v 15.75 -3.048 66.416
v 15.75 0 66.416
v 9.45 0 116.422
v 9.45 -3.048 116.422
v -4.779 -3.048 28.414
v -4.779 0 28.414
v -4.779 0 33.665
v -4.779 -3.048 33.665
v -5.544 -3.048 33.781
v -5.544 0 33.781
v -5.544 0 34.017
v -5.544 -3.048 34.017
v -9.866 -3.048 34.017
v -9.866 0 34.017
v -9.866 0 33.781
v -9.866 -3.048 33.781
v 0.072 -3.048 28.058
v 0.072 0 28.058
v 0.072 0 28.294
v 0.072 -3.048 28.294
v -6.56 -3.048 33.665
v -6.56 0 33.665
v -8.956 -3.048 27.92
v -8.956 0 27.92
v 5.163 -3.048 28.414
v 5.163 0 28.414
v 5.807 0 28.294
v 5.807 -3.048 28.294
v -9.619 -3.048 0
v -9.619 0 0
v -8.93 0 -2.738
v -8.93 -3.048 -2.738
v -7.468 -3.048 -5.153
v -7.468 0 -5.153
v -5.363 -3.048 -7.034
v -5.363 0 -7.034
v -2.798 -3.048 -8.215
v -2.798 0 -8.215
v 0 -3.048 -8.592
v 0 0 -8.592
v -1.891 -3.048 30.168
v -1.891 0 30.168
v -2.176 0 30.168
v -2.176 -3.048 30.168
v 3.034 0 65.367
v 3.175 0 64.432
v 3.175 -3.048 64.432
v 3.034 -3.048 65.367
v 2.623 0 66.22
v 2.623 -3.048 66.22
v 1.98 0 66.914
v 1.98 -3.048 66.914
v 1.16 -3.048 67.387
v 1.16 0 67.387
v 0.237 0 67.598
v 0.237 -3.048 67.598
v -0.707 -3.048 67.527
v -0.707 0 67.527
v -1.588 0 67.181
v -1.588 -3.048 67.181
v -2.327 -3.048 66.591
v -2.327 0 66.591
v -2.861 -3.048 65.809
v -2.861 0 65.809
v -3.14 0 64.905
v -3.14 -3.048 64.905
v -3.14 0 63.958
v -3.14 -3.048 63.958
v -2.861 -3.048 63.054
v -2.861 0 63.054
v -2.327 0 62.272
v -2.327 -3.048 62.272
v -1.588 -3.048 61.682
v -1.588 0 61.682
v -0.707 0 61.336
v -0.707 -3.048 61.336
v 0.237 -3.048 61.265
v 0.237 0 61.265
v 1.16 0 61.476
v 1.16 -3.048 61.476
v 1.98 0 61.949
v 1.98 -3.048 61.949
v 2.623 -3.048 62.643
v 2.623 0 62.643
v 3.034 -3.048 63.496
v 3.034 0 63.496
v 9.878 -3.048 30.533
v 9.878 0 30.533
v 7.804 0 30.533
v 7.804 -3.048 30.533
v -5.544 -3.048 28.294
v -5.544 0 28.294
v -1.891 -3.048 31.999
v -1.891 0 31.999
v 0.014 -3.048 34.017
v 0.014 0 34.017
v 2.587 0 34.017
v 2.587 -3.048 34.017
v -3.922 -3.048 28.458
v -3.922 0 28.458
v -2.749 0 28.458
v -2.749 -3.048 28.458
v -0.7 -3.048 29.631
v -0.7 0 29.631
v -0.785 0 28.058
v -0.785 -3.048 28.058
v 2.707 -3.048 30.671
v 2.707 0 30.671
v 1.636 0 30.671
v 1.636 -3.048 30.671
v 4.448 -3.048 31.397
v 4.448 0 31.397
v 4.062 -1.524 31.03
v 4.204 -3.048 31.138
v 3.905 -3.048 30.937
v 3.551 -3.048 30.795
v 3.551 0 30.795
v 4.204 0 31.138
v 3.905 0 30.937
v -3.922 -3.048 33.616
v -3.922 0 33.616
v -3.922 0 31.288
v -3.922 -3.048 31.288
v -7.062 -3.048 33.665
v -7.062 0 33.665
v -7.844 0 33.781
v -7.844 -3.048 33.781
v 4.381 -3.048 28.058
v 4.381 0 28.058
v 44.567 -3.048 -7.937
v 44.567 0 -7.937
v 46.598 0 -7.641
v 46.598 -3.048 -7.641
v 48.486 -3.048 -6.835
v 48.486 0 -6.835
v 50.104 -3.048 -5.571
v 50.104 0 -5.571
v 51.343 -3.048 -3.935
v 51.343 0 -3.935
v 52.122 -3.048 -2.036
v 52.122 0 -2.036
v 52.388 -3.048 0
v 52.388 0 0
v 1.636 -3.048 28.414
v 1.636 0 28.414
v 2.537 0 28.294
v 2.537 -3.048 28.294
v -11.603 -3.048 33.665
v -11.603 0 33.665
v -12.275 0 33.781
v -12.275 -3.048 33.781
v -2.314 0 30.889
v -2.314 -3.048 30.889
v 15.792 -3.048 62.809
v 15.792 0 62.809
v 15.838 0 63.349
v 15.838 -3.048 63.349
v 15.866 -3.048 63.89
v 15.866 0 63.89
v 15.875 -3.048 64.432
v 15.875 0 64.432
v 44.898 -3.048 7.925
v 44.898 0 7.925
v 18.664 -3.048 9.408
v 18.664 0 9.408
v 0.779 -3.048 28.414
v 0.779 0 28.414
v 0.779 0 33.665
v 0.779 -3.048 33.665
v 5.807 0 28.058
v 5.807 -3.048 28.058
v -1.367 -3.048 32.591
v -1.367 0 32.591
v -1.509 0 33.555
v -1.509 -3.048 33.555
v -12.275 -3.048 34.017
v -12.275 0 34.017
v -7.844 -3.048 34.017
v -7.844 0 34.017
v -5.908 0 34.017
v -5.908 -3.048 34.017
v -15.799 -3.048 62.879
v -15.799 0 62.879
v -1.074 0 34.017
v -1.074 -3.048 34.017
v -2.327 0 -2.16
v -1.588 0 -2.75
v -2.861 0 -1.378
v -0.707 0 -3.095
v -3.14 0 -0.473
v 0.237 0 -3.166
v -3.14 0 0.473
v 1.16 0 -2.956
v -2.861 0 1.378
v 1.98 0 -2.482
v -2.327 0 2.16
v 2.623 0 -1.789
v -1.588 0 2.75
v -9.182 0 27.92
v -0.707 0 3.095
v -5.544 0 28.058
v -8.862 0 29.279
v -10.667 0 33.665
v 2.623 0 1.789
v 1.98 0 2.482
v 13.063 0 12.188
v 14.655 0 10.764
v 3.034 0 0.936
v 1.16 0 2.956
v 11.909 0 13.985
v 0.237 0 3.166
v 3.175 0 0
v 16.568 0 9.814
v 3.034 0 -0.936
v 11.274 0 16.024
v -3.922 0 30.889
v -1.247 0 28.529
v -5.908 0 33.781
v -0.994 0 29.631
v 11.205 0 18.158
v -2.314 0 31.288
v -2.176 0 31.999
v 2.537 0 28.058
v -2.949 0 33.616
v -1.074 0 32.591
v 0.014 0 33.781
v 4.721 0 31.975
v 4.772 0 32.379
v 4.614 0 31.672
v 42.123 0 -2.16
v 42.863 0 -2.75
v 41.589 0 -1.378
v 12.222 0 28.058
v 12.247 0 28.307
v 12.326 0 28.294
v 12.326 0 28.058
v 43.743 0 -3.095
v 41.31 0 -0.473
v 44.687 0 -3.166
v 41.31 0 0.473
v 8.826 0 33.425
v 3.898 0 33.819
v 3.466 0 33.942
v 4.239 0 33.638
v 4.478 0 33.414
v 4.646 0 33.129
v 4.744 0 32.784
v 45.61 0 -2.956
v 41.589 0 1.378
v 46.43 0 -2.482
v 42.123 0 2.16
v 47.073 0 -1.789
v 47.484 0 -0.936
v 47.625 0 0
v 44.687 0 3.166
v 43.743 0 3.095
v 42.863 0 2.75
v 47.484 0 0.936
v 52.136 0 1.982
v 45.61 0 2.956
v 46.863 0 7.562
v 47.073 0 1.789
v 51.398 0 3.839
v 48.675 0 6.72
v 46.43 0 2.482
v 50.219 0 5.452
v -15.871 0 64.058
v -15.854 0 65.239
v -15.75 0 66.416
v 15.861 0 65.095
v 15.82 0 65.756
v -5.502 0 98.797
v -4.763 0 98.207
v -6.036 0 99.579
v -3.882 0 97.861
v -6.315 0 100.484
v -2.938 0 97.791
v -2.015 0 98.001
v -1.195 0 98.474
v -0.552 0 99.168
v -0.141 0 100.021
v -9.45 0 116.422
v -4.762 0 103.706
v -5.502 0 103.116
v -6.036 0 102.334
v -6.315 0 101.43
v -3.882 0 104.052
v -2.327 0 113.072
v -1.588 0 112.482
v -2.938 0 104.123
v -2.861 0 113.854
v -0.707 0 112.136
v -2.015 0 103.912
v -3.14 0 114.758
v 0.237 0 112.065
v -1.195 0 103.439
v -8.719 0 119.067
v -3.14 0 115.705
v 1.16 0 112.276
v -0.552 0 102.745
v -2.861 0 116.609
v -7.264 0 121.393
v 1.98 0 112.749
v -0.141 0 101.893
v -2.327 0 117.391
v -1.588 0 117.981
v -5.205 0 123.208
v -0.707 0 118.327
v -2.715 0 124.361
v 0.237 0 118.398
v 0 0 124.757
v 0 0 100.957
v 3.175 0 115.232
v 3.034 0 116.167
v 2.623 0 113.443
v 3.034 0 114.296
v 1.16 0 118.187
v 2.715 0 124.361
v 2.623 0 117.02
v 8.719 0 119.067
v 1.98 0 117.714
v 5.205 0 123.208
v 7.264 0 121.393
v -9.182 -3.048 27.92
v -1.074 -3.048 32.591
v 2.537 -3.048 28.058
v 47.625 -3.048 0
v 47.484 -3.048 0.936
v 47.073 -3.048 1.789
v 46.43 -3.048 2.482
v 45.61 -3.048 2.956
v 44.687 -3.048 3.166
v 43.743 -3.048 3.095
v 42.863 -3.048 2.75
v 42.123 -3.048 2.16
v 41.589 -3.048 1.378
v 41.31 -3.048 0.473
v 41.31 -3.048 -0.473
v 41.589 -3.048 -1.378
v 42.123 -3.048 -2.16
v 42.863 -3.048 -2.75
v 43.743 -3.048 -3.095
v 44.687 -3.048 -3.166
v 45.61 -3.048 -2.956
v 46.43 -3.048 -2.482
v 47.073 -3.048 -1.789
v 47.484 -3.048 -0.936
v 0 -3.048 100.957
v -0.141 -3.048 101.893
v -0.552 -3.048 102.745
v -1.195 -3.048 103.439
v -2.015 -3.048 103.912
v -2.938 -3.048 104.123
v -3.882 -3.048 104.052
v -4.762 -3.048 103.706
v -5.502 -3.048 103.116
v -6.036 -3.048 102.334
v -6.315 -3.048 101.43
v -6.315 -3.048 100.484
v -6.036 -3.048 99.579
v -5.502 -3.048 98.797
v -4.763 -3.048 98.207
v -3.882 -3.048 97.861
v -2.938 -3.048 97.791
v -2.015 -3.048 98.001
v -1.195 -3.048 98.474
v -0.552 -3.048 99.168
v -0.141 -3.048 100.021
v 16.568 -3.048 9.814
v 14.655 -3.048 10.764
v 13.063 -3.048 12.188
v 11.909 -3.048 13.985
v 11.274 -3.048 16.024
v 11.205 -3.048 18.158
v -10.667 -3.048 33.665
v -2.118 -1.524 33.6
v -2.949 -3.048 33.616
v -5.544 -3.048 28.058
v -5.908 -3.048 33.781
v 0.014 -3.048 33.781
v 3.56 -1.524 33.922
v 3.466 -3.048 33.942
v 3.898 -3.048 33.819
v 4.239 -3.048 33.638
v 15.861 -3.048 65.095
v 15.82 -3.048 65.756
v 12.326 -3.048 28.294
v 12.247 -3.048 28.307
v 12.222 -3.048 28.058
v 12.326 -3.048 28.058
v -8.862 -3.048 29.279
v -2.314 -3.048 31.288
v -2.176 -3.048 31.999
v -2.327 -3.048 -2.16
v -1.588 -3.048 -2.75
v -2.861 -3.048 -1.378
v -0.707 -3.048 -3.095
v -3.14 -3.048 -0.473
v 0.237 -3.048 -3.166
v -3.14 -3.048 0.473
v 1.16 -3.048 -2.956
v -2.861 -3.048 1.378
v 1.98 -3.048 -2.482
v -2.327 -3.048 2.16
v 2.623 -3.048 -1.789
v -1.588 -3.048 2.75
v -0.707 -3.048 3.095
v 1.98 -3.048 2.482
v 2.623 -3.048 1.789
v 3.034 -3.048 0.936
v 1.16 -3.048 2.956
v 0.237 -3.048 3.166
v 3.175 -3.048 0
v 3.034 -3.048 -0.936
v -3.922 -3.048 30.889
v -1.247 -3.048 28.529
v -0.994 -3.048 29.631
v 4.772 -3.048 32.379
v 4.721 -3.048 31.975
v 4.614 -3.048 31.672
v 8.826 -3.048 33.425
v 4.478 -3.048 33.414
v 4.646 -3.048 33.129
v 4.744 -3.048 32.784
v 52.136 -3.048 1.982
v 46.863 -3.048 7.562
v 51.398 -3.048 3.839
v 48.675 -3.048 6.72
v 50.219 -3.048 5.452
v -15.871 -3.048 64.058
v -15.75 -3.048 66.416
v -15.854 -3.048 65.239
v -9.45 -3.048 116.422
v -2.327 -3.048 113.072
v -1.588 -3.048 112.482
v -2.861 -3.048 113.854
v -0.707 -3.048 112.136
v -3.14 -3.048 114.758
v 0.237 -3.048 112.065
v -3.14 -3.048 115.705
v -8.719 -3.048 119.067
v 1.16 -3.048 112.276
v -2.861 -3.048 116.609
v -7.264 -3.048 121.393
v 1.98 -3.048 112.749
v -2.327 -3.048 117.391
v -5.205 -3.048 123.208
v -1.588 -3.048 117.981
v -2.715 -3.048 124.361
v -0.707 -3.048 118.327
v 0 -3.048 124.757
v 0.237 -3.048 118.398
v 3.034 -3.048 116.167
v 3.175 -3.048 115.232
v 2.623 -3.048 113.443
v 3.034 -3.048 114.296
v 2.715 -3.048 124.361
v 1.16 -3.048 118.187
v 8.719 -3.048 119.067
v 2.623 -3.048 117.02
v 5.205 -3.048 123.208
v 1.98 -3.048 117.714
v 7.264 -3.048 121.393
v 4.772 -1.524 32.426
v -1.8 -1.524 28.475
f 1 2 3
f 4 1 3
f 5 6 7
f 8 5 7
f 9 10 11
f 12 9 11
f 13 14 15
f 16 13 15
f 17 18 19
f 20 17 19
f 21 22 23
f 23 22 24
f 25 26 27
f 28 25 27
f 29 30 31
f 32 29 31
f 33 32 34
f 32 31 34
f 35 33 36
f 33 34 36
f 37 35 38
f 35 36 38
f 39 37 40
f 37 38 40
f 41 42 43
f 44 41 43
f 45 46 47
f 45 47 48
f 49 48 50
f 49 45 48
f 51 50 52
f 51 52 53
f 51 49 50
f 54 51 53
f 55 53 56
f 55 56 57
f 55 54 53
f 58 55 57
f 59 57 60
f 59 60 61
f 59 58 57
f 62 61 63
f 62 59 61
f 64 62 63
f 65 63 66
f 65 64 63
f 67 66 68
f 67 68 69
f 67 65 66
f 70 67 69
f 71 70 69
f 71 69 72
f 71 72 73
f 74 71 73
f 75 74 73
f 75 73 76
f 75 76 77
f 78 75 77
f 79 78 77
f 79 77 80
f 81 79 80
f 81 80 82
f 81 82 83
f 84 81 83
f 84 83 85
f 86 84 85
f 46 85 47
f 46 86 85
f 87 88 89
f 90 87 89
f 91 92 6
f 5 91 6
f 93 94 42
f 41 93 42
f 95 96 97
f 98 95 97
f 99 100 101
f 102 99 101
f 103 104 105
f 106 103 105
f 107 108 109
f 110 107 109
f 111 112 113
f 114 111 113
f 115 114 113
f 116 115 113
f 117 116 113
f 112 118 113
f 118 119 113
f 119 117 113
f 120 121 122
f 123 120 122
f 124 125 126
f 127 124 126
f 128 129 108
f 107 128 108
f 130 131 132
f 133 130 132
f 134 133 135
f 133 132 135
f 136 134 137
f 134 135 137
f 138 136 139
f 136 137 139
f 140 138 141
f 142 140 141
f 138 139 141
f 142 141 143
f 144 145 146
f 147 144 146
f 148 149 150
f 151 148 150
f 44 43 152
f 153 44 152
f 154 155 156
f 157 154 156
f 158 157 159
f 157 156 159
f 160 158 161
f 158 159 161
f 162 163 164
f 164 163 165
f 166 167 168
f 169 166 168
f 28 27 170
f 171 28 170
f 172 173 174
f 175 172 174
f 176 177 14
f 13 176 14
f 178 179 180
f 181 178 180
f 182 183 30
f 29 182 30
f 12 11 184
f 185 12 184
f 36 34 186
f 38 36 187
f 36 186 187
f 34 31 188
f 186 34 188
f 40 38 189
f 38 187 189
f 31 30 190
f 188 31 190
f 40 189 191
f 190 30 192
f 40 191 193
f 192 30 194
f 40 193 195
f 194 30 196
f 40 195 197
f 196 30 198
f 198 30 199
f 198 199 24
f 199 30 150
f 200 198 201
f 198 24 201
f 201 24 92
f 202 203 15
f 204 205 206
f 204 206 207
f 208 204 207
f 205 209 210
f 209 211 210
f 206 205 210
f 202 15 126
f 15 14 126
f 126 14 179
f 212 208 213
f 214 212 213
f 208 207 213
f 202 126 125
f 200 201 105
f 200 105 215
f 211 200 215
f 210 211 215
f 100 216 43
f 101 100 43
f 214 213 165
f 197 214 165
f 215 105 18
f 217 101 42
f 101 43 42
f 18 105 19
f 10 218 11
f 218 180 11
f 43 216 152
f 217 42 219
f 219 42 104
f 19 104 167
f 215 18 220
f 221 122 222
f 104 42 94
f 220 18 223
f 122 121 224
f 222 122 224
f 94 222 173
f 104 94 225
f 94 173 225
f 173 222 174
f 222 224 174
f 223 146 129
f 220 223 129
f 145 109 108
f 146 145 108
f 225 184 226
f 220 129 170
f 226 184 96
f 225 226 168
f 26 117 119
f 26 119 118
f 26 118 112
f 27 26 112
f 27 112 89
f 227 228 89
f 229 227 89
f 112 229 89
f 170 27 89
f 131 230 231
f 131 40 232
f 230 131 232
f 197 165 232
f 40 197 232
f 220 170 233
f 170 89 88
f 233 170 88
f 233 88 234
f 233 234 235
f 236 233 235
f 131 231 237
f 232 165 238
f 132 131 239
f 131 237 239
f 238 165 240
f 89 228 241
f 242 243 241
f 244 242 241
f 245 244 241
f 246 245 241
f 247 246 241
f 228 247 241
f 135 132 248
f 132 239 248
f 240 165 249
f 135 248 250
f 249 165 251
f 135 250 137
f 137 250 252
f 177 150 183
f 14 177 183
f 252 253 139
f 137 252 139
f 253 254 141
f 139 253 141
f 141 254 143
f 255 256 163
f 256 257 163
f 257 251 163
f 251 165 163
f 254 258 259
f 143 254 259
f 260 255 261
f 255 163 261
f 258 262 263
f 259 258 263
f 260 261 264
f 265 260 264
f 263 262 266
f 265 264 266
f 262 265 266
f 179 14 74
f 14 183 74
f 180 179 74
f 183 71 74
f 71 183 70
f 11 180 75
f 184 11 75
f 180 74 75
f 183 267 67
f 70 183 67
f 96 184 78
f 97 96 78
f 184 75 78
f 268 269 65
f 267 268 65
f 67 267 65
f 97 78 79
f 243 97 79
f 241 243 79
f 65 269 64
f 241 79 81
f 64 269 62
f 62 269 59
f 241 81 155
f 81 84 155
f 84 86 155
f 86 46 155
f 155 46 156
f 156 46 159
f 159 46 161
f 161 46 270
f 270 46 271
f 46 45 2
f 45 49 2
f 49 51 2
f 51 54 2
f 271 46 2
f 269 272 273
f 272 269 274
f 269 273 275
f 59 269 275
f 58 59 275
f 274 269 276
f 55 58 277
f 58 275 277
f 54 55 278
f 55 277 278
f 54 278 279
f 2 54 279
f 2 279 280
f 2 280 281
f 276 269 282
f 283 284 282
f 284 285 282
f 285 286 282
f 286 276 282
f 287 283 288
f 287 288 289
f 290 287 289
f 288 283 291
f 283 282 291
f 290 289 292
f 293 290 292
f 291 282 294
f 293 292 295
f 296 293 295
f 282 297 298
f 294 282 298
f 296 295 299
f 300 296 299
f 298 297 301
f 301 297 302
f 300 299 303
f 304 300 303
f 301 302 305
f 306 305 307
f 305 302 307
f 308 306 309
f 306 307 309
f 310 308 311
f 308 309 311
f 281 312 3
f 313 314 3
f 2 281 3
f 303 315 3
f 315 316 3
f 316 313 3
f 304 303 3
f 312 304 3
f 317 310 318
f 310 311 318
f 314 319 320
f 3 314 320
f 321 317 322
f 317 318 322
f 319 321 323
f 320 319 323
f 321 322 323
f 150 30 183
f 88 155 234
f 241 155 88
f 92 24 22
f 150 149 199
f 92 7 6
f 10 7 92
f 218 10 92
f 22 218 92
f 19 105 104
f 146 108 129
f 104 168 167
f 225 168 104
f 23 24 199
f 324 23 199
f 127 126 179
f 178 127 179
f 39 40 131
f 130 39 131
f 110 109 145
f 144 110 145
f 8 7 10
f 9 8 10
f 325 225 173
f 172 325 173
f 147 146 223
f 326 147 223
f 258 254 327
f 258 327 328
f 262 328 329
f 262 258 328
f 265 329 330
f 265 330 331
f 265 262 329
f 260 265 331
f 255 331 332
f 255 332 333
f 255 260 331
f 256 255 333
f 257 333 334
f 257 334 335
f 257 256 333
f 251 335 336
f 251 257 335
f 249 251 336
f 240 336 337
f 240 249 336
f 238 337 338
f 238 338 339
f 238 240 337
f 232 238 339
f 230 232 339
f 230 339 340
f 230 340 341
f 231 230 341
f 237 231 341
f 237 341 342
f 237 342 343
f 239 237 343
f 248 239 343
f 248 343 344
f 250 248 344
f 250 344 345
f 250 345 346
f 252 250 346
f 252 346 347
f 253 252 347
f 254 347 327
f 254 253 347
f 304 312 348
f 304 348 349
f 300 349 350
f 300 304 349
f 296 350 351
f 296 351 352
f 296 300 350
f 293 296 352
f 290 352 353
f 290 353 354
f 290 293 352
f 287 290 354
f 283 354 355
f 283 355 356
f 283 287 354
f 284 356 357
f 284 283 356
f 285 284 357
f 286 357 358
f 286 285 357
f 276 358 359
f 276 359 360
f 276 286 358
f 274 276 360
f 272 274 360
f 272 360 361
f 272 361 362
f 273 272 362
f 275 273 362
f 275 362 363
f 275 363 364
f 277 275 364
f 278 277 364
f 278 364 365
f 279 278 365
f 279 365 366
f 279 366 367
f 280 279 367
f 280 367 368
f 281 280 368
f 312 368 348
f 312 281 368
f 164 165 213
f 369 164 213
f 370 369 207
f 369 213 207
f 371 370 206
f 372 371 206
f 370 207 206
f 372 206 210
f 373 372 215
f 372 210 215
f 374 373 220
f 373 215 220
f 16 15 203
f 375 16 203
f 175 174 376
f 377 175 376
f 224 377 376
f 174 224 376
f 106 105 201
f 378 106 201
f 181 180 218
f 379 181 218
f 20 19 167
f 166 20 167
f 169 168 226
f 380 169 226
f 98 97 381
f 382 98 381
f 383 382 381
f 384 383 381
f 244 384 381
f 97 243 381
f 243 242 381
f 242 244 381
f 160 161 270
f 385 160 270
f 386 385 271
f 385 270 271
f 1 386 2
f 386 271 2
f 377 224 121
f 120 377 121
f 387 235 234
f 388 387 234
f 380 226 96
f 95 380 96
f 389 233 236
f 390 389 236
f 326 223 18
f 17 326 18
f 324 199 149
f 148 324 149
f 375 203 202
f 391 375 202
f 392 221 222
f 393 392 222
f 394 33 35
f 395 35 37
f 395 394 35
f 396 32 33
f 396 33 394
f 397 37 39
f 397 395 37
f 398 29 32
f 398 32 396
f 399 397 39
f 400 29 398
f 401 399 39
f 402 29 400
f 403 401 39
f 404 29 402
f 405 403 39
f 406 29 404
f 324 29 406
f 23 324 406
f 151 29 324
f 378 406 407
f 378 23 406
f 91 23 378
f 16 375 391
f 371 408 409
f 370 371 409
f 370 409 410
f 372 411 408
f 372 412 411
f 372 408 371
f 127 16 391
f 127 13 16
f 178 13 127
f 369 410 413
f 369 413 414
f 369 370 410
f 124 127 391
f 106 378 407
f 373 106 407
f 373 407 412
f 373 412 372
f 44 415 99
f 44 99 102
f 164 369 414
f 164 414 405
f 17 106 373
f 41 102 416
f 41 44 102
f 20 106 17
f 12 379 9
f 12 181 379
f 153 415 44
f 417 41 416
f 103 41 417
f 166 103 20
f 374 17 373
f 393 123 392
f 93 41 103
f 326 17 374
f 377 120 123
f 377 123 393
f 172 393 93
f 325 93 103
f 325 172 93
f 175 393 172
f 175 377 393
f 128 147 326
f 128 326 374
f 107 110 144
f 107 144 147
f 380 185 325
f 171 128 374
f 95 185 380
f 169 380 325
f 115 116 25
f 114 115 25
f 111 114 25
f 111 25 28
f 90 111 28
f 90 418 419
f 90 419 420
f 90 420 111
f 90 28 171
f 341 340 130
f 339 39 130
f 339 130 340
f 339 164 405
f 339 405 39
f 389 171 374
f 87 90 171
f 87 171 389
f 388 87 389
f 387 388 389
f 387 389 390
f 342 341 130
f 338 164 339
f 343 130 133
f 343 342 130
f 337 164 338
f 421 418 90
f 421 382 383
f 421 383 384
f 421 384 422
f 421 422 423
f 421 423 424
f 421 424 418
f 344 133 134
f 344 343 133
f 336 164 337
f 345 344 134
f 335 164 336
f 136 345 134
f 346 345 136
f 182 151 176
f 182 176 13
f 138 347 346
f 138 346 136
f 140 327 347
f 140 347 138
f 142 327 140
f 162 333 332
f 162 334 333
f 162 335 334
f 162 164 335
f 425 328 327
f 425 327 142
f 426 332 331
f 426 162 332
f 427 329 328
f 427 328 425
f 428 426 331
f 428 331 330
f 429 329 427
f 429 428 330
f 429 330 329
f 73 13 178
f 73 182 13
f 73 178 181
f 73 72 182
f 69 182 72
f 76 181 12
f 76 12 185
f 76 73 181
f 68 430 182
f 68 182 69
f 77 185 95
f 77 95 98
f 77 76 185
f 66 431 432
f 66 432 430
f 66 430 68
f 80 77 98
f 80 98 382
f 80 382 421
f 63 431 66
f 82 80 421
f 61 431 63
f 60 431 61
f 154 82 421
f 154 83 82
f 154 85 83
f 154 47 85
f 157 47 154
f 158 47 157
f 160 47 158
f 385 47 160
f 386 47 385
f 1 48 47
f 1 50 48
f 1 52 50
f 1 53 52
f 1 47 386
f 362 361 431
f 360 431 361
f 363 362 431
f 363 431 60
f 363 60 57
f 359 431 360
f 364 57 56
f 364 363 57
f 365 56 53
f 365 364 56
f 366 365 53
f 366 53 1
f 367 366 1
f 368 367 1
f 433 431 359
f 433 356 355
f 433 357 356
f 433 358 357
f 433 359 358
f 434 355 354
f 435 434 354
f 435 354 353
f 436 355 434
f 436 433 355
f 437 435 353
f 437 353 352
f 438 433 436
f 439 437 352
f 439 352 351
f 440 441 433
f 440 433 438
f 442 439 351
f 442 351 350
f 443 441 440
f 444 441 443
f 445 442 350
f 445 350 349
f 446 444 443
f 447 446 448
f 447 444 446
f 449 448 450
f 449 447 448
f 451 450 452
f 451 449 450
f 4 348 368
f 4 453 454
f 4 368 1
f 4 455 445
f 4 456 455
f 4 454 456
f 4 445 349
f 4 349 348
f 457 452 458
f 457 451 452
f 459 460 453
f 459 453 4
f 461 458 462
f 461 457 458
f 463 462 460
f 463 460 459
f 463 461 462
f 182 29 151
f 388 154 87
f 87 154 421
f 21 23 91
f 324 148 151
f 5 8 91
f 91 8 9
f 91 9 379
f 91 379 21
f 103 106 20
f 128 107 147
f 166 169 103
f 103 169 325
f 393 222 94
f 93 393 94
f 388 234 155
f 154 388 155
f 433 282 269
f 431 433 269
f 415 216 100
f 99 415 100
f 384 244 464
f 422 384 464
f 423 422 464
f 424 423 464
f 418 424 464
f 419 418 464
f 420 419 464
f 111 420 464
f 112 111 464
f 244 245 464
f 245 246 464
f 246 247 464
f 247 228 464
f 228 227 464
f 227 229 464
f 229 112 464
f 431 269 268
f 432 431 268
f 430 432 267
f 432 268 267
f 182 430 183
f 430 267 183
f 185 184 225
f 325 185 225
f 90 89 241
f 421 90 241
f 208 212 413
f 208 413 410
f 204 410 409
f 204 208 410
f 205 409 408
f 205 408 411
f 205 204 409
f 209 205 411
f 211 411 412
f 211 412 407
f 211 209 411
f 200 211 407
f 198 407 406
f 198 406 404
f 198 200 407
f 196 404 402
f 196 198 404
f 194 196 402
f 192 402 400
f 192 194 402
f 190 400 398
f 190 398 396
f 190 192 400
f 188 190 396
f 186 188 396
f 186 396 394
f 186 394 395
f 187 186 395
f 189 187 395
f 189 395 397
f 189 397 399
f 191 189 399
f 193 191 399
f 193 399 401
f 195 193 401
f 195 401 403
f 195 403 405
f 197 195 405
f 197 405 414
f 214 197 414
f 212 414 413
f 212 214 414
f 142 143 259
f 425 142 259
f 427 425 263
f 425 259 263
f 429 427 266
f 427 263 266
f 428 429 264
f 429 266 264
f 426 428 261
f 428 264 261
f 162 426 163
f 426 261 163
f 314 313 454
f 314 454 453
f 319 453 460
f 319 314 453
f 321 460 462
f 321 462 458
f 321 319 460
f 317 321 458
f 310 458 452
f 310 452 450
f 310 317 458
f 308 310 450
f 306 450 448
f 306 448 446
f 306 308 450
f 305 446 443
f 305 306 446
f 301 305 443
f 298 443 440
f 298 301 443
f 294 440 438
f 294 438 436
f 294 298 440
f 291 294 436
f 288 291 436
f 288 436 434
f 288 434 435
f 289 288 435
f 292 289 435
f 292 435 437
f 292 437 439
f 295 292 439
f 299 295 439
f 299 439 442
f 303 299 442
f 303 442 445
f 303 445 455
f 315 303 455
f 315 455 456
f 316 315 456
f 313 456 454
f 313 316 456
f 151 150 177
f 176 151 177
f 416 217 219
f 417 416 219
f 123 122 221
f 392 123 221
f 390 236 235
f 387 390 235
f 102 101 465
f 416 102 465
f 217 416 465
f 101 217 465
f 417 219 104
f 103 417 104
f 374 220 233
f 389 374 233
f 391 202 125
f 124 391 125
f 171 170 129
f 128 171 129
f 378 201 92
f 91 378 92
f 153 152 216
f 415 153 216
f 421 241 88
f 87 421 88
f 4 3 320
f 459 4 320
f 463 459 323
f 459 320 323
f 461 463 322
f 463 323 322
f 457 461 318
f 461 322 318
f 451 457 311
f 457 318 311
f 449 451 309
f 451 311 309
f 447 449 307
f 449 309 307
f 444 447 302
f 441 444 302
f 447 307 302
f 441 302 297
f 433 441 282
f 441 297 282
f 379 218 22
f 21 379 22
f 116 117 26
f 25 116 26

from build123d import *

# Parameters (mm, degrees)
F0_R     = 3.175
F1_DEPTH = 3.048


with BuildPart() as f1:
    # F0 (on Front) → F1 (new body)
    with BuildSketch(Plane.XZ):
        with BuildLine():
            ThreePointArc((-9.4502929642, 116.4222056828), (-0.596483242, 105.7252757886), (9.525, 115.2315806828))
            ThreePointArc((9.525, 115.2315806828), (9.5063048942, 115.8280639248), (9.4502929642, 116.4222056828))
            ThreePointArc((9.4502929642, 116.4222056828), (0, 124.7565806828), (-9.4502929642, 116.4222056828))
        make_face()
        with Locations((0, 115.2315806828)):
            Circle(F0_R, mode=Mode.SUBTRACT)
        with BuildLine():
            ThreePointArc((9.4502929642, 116.4222056828), (9.5063048942, 115.8280639248), (9.525, 115.2315806828))
            ThreePointArc((9.525, 115.2315806828), (-0.596483242, 105.7252757886), (-9.4502929642, 116.4222056828))
            Line((-9.4502929642, 116.4222056828), (-15.7504882737, 66.4159556828))
            ThreePointArc((-15.7504882737, 66.4159556828), (0, 80.3065806828), (15.7504882737, 66.4159556828))
            Line((15.7504882737, 66.4159556828), (9.4502929642, 116.4222056828))
        make_face()
        with Locations((-3.175, 100.9567806828)):
            Circle(F0_R, mode=Mode.SUBTRACT)
        with BuildLine():
            ThreePointArc((15.875, 64.4315806828), (15.8438414904, 65.4257194194), (15.7504882737, 66.4159556828))
            ThreePointArc((15.7504882737, 66.4159556828), (0, 80.3065806828), (-15.7504882737, 66.4159556828))
            ThreePointArc((-15.7504882737, 66.4159556828), (-15.8735137675, 64.6488033167), (-15.7988908218, 62.8789462115))
            ThreePointArc((-15.7988908218, 62.8789462115), (-0.0350334036, 48.5566193392), (15.7918841581, 62.8092306167))
            ThreePointArc((15.7918841581, 62.8092306167), (15.8542074228, 63.6193418048), (15.875, 64.4315806828))
        make_face()
        with Locations((0, 64.4315806828)):
            Circle(F0_R, mode=Mode.SUBTRACT)
        with BuildLine():
            ThreePointArc((15.7918841581, 62.8092306167), (-0.0350334036, 48.5566193392), (-15.7988908218, 62.8789462115))
            Line((-15.7988908218, 62.8789462115), (-9.6194684488, 0))
            ThreePointArc((-9.6194684488, 0), (-0.6064835851, 10.4451574562), (9.3848660442, 0.9315806828))
            ThreePointArc((9.3848660442, 0.9315806828), (6.6444220698, -5.7538829911), (0, -8.5923884202))
            Line((0, -8.5923884202), (44.566778303, -7.9366409191))
            ThreePointArc((44.566778303, -7.9366409191), (36.5142317093, 0.1657947093), (44.898157601, 7.9248382327))
            Line((44.898157601, 7.9248382327), (18.664461469, 9.408380228))
            ThreePointArc((18.664461469, 9.408380228), (13.0633502744, 12.1880545359), (11.2047605357, 18.158371115))
            Line((11.2047605357, 18.158371115), (12.2217881669, 28.0580733262))
            Line((12.2217881669, 28.0580733262), (9.806785479, 28.0580733262))
            Line((9.806785479, 28.0580733262), (9.806785479, 28.294084817))
            Line((9.806785479, 28.294084817), (10.6072340892, 28.4135123184))
            Line((10.6072340892, 28.4135123184), (10.0157836063, 30.1324152843))
            Line((10.0157836063, 30.1324152843), (7.6698862582, 30.1324152843))
            Line((7.6698862582, 30.1324152843), (7.0699052395, 28.4135123184))
            Line((7.0699052395, 28.4135123184), (7.8703538498, 28.294084817))
            Line((7.8703538498, 28.294084817), (7.8703538498, 28.0580733262))
            Line((7.8703538498, 28.0580733262), (5.9111741252, 28.0580733262))
            Line((5.9111741252, 28.0580733262), (5.9111741252, 28.294084817))
            Line((5.9111741252, 28.294084817), (6.5865082102, 28.4135123184))
            Line((6.5865082102, 28.4135123184), (8.6167757333, 34.0649922933))
            Line((8.6167757333, 34.0649922933), (9.4598770226, 34.0649922933))
            Line((9.4598770226, 34.0649922933), (11.5711846359, 28.4135123184))
            Line((11.5711846359, 28.4135123184), (12.2473153484, 28.3065537876))
            Line((12.2473153484, 28.3065537876), (15.7918841581, 62.8092306167))
        make_face()
        Polygon((-7.8443148705, 34.0166525904), (-5.9078832413, 34.0166525904), (-5.9078832413, 33.7806410996), (-6.5604692309, 33.6654788662), (-8.9561280379, 27.9201629973), (-9.1821872369, 27.9201629973), (-11.6034376513, 33.6654788662), (-12.2745064684, 33.7806410996), (-12.2745064684, 34.0166525904), (-9.8660518577, 34.0166525904), (-9.8660518577, 33.7806410996), (-10.666500468, 33.6654788662), (-8.862292144, 29.2793617032), (-7.0623490878, 33.6654788662), (-7.8443148705, 33.7806410996), align=None, mode=Mode.SUBTRACT)
        with BuildLine():
            Line((-5.5439137134, 28.0580733262), (-5.5439137134, 28.294084817))
            Line((-5.5439137134, 28.294084817), (-4.7790090023, 28.4135123184))
            Line((-4.7790090023, 28.4135123184), (-4.7790090023, 33.6654788662))
            Line((-4.7790090023, 33.6654788662), (-5.5439137134, 33.7806410996))
            Line((-5.5439137134, 33.7806410996), (-5.5439137134, 34.0166525904))
            Line((-5.5439137134, 34.0166525904), (-1.0739129483, 34.0166525904))
            Line((-1.0739129483, 34.0166525904), (-1.0739129483, 32.5906313539))
            Line((-1.0739129483, 32.5906313539), (-1.3667946778, 32.5906313539))
            Line((-1.3667946778, 32.5906313539), (-1.5089702747, 33.5545819006))
            add(Edge.make_bspline(
                [(-1.5089702747, 33.5545819006), (-2.0065848637, 33.6157174073), (-2.9492090708, 33.6157174073)],
                knots=[0, 0, 0, 1, 1, 1], degree=2))
            Line((-2.9492090708, 33.6157174073), (-3.9216901533, 33.6157174073))
            Line((-3.9216901533, 33.6157174073), (-3.9216901533, 31.2883028868))
            Line((-3.9216901533, 31.2883028868), (-2.3136841529, 31.2883028868))
            Line((-2.3136841529, 31.2883028868), (-2.1757738239, 31.999180871))
            Line((-2.1757738239, 31.999180871), (-1.8914226302, 31.999180871))
            Line((-1.8914226302, 31.999180871), (-1.8914226302, 30.1679591835))
            Line((-1.8914226302, 30.1679591835), (-2.1757738239, 30.1679591835))
            Line((-2.1757738239, 30.1679591835), (-2.3136841529, 30.8887894596))
            Line((-2.3136841529, 30.8887894596), (-3.9216901533, 30.8887894596))
            Line((-3.9216901533, 30.8887894596), (-3.9216901533, 28.4575867534))
            Line((-3.9216901533, 28.4575867534), (-2.7487414792, 28.4575867534))
            add(Edge.make_bspline(
                [(-2.7487414792, 28.4575867534), (-1.6028061686, 28.4575867534), (-1.2473671765, 28.5286745518)],
                knots=[0, 0, 0, 1, 1, 1], degree=2))
            Line((-1.2473671765, 28.5286745518), (-0.9942946141, 29.6305354274))
            Line((-0.9942946141, 29.6305354274), (-0.6999911286, 29.6305354274))
            Line((-0.6999911286, 29.6305354274), (-0.7852964867, 28.0580733262))
            Line((-0.7852964867, 28.0580733262), (-5.5439137134, 28.0580733262))
        make_face(mode=Mode.SUBTRACT)
        with BuildLine():
            Line((2.7065361721, 30.6712607964), (1.6359539277, 30.6712607964))
            Line((1.6359539277, 30.6712607964), (1.6359539277, 28.4135123184))
            Line((1.6359539277, 28.4135123184), (2.5373472118, 28.294084817))
            Line((2.5373472118, 28.294084817), (2.5373472118, 28.0580733262))
            Line((2.5373472118, 28.0580733262), (0.0720223624, 28.0580733262))
            Line((0.0720223624, 28.0580733262), (0.0720223624, 28.294084817))
            Line((0.0720223624, 28.294084817), (0.7786350787, 28.4135123184))
            Line((0.7786350787, 28.4135123184), (0.7786350787, 33.6654788662))
            Line((0.7786350787, 33.6654788662), (0.0137303676, 33.7806410996))
            Line((0.0137303676, 33.7806410996), (0.0137303676, 34.0166525904))
            Line((0.0137303676, 34.0166525904), (2.5871086707, 34.0166525904))
            add(Edge.make_bspline(
                [(2.5871086707, 34.0166525904), (3.7060306179, 34.0166525904), (4.2391891061, 33.6384655028)],
                knots=[0, 0, 0, 1, 1, 1], degree=2))
            add(Edge.make_bspline(
                [(4.2391891061, 33.6384655028), (4.7723475943, 33.2602784151), (4.7723475943, 32.4257076616)],
                knots=[0, 0, 0, 1, 1, 1], degree=2))
            add(Edge.make_bspline(
                [(4.7723475943, 32.4257076616), (4.7723475943, 31.8299919108), (4.4481872335, 31.3970672184)],
                knots=[0, 0, 0, 1, 1, 1], degree=2))
            add(Edge.make_bspline(
                [(4.4481872335, 31.3970672184), (4.1240268727, 30.9641425259), (3.5510592174, 30.7949535657)],
                knots=[0, 0, 0, 1, 1, 1], degree=2))
            Line((3.5510592174, 30.7949535657), (5.1633304857, 28.4135123184))
            Line((5.1633304857, 28.4135123184), (5.8073859394, 28.294084817))
            Line((5.8073859394, 28.294084817), (5.8073859394, 28.0580733262))
            Line((5.8073859394, 28.0580733262), (4.381364703, 28.0580733262))
            Line((4.381364703, 28.0580733262), (2.7065361721, 30.6712607964))
        make_face(mode=Mode.SUBTRACT)
        with BuildLine():
            ThreePointArc((9.3848660442, 0.9315806828), (-0.6064835851, 10.4451574562), (-9.6194684488, 0))
            ThreePointArc((-9.6194684488, 0), (-6.4854039547, -6.1721629528), (0, -8.5923884202))
            ThreePointArc((0, -8.5923884202), (6.6444220698, -5.7538829911), (9.3848660442, 0.9315806828))
        make_face()
        Circle(F0_R, mode=Mode.SUBTRACT)
        Polygon((12.3261370552, 28.294084817), (12.2473153484, 28.3065537876), (12.2217881669, 28.0580733262), (12.3261370552, 28.0580733262), align=None)
        Polygon((12.2217881669, 28.0580733262), (12.2473153484, 28.3065537876), (11.5711846359, 28.4135123184), (9.4598770226, 34.0649922933), (8.6167757333, 34.0649922933), (6.5865082102, 28.4135123184), (5.9111741252, 28.294084817), (5.9111741252, 28.0580733262), (7.8703538498, 28.0580733262), (7.8703538498, 28.294084817), (7.0699052395, 28.4135123184), (7.6698862582, 30.1324152843), (10.0157836063, 30.1324152843), (10.6072340892, 28.4135123184), (9.806785479, 28.294084817), (9.806785479, 28.0580733262), align=None)
        Polygon((7.8035313193, 30.5333504675), (8.8257738607, 33.4252021075), (9.8778732774, 30.5333504675), align=None, mode=Mode.SUBTRACT)
        with BuildLine():
            ThreePointArc((44.898157601, 7.9248382327), (36.5142317093, 0.1657947093), (44.566778303, -7.9366409191))
            ThreePointArc((44.566778303, -7.9366409191), (50.1037966903, -5.571219726), (52.3875, 0))
            ThreePointArc((52.3875, 0), (50.2189321892, 5.4519104584), (44.898157601, 7.9248382327))
        make_face()
        with Locations((44.45, 0)):
            Circle(F0_R, mode=Mode.SUBTRACT)
    extrude(amount=F1_DEPTH)


solid = f1.part
